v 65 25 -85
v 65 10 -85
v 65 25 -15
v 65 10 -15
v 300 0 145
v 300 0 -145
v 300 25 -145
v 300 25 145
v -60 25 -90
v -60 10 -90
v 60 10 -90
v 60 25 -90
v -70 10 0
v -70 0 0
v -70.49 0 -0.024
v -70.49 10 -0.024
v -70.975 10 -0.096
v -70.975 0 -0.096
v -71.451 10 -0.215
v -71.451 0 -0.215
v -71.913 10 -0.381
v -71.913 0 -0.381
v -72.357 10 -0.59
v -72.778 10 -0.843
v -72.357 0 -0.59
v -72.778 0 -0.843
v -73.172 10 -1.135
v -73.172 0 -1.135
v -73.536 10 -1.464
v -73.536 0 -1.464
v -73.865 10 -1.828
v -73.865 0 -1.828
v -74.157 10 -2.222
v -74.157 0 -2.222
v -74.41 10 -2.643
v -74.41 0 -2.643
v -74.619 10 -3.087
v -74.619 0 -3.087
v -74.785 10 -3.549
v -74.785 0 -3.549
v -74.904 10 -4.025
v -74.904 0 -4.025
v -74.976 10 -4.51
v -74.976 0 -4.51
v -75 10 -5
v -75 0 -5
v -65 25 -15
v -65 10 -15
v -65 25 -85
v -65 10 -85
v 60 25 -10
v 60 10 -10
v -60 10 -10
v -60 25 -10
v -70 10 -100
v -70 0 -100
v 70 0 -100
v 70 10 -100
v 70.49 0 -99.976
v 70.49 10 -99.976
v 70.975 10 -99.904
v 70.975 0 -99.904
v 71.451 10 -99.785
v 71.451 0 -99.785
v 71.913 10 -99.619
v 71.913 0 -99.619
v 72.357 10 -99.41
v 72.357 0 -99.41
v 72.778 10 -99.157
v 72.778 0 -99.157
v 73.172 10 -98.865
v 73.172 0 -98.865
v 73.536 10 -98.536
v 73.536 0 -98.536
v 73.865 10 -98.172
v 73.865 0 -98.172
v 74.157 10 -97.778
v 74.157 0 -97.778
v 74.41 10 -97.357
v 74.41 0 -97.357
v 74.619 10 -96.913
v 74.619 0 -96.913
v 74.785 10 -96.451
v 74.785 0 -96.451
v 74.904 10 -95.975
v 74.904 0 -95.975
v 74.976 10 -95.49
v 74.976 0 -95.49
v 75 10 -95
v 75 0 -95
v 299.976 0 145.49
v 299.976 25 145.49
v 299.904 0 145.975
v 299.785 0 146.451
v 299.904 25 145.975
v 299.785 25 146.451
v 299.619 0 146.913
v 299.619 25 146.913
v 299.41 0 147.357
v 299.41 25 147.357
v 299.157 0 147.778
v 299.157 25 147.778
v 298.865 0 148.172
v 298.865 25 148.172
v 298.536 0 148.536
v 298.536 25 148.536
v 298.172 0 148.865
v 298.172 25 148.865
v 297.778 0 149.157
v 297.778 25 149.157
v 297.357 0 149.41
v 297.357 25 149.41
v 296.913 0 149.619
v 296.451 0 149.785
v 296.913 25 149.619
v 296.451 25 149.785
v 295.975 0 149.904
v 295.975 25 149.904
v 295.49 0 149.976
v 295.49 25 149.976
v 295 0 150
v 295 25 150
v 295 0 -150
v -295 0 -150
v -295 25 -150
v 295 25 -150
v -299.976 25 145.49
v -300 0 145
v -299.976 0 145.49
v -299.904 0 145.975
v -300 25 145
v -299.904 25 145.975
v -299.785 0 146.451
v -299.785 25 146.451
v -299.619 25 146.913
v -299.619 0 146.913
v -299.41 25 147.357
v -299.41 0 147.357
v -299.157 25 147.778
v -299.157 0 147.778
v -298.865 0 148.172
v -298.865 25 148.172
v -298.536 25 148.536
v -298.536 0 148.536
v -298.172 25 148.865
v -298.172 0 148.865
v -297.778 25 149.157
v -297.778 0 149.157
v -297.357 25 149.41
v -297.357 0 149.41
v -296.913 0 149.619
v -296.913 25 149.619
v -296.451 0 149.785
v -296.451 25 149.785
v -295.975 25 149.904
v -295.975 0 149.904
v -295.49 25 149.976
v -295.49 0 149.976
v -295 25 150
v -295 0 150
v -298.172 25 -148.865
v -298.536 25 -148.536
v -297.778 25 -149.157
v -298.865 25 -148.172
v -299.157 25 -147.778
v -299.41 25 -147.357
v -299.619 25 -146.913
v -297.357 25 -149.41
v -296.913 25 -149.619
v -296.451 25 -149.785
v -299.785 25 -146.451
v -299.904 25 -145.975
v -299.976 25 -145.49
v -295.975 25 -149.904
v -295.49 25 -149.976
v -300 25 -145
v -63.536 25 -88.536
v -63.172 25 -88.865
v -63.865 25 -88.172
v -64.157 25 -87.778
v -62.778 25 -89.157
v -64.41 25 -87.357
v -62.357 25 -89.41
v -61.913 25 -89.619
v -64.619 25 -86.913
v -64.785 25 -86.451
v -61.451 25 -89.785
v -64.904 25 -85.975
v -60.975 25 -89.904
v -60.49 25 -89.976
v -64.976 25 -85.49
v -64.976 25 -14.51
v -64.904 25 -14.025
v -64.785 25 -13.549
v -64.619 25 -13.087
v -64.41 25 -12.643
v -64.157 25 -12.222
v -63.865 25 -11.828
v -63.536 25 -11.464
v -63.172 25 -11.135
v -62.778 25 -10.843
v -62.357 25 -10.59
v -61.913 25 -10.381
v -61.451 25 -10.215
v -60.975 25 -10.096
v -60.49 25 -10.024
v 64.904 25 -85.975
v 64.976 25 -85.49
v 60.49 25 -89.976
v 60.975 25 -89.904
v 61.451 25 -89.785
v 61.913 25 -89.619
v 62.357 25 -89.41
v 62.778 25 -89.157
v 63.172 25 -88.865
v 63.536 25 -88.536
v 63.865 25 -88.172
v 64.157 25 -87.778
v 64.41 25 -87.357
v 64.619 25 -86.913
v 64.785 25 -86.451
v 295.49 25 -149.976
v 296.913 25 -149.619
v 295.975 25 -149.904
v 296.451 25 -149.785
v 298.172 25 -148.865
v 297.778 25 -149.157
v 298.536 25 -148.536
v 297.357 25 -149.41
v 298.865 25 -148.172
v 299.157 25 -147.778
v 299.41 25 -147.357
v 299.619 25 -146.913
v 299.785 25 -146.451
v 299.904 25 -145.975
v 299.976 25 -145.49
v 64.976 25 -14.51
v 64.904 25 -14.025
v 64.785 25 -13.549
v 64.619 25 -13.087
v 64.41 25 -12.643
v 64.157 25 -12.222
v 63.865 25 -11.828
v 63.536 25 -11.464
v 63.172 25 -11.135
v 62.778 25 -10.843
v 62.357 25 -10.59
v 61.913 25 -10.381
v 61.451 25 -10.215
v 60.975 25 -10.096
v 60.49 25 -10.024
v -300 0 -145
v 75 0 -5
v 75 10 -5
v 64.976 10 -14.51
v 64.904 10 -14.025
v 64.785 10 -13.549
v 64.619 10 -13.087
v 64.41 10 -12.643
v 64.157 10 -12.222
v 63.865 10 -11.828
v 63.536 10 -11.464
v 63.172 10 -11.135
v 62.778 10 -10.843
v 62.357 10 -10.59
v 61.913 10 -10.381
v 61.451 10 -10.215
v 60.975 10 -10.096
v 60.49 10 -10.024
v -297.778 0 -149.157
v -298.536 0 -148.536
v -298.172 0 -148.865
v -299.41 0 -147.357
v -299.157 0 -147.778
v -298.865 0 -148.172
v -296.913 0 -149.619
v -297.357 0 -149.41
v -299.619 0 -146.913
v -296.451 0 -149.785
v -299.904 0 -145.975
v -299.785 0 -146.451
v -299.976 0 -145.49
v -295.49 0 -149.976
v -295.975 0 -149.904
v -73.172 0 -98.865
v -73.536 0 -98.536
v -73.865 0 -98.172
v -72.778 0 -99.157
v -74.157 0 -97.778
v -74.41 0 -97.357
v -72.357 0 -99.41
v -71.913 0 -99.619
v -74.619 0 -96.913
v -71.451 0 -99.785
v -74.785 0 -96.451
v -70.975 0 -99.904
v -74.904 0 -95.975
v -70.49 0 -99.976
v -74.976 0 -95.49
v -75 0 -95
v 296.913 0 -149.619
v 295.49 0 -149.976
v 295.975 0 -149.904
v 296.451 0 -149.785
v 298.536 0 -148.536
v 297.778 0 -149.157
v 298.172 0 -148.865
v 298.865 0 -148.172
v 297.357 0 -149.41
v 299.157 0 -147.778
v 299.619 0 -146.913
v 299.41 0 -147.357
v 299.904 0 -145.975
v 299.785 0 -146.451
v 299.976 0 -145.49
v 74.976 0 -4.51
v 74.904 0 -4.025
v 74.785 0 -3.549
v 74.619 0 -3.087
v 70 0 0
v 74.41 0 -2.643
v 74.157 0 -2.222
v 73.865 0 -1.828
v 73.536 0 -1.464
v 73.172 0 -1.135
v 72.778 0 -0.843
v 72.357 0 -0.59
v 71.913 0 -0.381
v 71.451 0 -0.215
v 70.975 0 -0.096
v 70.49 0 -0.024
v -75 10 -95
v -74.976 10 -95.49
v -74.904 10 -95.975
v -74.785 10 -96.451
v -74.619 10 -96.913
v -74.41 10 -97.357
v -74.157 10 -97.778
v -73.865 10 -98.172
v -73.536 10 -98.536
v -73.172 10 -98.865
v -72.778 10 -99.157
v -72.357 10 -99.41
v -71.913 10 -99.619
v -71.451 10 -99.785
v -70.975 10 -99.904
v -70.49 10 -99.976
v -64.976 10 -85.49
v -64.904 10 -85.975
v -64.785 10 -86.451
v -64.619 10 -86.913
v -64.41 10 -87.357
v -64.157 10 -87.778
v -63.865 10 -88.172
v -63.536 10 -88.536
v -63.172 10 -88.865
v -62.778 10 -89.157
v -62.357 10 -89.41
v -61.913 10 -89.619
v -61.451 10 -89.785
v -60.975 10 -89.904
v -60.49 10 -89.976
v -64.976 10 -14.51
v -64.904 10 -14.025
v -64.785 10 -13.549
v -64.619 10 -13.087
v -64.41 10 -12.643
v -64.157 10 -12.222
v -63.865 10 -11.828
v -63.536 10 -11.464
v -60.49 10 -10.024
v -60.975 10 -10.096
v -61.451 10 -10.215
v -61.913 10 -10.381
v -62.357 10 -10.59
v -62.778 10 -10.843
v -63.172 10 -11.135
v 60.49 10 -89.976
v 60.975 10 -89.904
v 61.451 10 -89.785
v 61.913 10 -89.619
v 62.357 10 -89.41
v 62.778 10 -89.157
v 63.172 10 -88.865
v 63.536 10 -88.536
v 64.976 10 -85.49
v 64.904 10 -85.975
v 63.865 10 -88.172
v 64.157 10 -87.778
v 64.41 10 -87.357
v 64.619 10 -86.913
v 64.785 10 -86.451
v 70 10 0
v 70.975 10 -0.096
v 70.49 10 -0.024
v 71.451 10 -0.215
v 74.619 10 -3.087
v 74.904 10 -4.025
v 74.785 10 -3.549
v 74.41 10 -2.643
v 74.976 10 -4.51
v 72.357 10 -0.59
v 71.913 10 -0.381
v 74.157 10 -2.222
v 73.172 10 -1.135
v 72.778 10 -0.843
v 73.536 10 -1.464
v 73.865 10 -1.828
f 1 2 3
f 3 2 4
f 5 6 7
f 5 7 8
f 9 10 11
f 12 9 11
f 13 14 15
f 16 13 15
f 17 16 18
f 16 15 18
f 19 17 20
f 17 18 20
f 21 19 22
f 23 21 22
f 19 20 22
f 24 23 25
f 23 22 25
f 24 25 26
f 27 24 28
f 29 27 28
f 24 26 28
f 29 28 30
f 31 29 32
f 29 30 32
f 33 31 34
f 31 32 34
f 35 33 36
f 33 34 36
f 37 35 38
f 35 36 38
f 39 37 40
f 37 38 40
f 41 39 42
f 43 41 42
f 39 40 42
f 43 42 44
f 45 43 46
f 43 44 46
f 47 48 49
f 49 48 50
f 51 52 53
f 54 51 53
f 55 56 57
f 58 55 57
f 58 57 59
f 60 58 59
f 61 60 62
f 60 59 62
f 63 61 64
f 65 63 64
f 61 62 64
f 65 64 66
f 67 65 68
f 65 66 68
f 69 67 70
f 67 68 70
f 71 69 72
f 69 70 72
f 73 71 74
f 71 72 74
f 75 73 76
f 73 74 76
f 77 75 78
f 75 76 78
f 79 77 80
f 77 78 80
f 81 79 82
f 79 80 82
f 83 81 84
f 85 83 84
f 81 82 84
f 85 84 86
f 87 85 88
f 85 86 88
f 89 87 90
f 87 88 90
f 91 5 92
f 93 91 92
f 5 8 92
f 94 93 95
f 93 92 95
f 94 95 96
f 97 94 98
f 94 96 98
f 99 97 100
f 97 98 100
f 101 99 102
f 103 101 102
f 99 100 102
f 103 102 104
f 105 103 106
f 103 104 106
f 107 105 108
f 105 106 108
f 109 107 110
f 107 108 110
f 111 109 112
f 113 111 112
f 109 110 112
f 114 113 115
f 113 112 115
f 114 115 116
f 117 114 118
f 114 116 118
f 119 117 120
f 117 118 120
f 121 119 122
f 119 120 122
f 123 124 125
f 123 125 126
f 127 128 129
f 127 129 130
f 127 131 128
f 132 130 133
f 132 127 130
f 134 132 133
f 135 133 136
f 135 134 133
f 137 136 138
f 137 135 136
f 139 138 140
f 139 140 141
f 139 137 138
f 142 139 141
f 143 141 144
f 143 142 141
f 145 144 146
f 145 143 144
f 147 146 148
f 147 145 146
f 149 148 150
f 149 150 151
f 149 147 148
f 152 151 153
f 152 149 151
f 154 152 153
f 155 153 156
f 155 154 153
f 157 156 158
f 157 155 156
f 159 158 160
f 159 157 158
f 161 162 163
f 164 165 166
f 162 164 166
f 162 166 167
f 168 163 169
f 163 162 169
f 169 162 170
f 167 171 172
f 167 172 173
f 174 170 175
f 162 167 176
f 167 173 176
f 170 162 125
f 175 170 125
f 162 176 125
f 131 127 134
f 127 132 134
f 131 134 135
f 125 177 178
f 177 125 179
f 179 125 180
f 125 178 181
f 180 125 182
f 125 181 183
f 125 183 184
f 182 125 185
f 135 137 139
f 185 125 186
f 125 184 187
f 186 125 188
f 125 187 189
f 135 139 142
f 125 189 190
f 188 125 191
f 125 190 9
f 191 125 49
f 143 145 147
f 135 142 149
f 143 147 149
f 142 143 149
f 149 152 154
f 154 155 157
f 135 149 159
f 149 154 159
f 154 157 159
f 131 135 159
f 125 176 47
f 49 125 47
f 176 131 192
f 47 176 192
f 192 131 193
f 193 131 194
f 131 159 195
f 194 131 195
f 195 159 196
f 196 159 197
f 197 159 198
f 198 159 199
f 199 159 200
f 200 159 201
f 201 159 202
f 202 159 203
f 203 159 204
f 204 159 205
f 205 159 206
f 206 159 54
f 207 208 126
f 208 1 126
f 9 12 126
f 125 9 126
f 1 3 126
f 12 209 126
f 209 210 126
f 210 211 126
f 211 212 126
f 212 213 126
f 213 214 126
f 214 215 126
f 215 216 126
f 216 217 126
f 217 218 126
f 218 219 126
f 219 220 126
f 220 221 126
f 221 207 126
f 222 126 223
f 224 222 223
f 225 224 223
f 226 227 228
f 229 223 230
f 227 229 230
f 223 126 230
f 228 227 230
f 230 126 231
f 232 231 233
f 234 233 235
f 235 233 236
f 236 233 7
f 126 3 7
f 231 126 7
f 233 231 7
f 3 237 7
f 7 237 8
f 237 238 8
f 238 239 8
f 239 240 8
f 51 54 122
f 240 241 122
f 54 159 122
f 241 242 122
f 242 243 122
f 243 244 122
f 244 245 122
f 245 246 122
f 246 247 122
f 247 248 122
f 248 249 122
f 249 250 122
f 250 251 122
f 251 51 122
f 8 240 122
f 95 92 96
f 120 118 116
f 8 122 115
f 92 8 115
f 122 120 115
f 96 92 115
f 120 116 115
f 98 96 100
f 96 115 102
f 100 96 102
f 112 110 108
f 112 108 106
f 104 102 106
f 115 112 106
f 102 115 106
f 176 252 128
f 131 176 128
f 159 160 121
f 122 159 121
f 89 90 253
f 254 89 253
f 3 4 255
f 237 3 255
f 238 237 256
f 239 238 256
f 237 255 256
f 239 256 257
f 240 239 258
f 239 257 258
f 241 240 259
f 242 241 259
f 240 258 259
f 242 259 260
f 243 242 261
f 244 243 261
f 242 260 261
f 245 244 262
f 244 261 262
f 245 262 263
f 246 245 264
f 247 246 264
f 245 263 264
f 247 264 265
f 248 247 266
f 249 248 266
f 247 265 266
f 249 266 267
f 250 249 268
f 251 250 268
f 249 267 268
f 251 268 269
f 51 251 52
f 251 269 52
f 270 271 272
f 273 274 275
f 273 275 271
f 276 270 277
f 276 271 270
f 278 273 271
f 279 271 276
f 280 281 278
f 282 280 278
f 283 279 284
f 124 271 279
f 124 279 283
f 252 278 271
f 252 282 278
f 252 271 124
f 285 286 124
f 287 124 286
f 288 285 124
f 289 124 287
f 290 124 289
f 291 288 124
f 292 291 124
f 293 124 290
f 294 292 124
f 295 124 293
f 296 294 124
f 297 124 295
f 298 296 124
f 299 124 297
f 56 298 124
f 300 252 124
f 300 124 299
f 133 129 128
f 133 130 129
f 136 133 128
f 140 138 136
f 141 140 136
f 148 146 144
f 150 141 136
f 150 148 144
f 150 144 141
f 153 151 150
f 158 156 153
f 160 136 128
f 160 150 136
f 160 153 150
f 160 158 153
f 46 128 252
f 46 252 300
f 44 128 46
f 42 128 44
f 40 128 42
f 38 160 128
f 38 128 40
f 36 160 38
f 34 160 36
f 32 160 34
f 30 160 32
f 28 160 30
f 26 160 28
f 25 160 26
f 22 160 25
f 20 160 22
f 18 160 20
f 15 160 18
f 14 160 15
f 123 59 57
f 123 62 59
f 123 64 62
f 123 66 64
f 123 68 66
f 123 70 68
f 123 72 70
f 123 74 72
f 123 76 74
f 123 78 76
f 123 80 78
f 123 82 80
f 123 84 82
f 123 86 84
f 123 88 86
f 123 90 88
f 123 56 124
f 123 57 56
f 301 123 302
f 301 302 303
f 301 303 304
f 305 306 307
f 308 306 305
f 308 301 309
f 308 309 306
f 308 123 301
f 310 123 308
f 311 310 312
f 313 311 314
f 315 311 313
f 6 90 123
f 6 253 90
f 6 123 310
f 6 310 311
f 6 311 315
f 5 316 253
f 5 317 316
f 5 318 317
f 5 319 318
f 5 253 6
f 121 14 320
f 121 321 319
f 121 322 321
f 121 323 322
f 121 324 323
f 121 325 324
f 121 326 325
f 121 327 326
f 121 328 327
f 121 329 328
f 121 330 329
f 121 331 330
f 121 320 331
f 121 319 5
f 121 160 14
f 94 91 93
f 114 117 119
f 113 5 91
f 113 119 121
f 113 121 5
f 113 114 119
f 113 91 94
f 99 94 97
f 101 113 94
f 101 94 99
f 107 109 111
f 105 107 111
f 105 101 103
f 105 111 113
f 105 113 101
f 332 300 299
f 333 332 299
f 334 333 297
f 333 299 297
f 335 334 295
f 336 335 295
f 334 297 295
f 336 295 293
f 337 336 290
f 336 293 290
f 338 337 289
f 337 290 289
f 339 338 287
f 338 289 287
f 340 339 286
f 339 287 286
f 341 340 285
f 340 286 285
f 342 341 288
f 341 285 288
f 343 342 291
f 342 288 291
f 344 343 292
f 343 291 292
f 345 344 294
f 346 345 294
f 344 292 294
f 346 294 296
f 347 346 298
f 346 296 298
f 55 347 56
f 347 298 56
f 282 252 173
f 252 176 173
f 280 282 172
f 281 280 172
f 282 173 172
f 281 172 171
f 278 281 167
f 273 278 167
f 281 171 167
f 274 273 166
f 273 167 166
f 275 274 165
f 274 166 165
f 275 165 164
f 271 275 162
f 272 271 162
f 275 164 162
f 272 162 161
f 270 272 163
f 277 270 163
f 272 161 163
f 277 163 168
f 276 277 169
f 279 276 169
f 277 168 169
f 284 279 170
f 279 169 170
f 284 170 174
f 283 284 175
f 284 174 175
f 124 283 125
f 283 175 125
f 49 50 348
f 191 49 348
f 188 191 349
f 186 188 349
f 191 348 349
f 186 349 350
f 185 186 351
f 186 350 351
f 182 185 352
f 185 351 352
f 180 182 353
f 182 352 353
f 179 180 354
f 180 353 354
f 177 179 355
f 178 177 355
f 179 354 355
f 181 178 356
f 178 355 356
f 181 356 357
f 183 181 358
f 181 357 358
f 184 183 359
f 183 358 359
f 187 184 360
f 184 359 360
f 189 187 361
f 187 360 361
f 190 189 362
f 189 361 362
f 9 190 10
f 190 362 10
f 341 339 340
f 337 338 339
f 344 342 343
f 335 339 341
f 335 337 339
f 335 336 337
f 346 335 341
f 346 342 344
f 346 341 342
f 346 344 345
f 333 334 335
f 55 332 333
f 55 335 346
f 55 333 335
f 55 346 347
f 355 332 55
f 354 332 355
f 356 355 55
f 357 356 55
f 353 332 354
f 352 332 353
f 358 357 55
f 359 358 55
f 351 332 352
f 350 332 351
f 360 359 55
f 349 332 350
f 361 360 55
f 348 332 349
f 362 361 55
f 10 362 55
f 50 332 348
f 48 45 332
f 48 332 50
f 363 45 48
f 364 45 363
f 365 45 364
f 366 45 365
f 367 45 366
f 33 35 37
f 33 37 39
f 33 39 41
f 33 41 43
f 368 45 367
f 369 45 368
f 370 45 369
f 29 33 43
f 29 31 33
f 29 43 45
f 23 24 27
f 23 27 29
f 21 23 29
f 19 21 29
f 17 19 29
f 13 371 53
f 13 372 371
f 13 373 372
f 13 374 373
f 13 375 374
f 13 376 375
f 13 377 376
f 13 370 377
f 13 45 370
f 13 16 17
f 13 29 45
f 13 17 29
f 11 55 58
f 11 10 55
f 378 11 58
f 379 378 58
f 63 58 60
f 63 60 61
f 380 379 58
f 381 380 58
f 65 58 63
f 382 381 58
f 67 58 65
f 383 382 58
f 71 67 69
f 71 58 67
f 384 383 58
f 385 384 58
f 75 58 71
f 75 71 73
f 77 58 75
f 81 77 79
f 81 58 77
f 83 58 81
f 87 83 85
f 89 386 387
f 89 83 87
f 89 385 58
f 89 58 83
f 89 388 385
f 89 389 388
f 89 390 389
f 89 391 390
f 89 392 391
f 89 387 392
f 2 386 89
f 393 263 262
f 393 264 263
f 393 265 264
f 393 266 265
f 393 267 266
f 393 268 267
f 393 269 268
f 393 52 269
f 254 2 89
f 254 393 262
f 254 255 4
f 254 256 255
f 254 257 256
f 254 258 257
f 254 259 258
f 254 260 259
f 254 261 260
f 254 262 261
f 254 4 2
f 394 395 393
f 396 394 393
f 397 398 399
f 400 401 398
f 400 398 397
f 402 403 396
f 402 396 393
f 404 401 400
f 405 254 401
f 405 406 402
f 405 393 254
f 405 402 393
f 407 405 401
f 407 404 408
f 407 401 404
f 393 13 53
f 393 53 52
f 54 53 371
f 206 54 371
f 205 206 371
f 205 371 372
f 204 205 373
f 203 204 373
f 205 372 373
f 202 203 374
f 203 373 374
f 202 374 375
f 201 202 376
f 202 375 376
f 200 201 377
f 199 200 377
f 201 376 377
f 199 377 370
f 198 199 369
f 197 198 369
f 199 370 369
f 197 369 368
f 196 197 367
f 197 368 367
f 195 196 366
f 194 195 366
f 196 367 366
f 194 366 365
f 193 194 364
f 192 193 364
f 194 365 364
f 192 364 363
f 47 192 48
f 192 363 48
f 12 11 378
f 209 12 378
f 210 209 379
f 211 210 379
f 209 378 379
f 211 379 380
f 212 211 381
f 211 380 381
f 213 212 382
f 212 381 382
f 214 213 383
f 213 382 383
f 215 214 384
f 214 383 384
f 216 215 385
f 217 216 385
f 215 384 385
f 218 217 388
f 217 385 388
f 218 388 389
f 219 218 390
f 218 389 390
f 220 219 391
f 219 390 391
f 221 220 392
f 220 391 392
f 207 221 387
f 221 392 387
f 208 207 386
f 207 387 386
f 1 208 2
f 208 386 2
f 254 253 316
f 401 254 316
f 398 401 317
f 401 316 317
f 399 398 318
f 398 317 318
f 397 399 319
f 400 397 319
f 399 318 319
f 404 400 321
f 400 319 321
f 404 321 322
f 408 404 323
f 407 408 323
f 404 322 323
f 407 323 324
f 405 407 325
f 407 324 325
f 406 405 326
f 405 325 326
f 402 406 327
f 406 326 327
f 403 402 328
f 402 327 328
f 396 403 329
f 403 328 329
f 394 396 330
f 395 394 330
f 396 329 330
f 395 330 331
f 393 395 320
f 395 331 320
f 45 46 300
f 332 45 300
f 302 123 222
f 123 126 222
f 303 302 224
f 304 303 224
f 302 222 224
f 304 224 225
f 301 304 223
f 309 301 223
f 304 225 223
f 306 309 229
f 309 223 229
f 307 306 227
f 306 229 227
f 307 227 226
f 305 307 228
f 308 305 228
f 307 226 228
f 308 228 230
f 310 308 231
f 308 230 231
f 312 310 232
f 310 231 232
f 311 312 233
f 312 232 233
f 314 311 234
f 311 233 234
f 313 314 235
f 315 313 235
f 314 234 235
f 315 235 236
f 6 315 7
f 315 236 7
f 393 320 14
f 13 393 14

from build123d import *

# Parameters (mm, degrees)
F0_W     = 600
F0_H     = 300
F1_DEPTH = 25
F2_R     = 5
F4_DEPTH = 10
F6_DEPTH = 25


with BuildPart() as f1:
    # F0 (on Front) → F1 (new body)
    with BuildSketch(Plane.XZ):
        Rectangle(F0_W, F0_H)
    extrude(amount=-F1_DEPTH)

    # F2
    f2_edges = [f1.edges().sort_by_distance(p)[0] for p in [
        (300, 12.5, -150),
        (-300, 12.5, -150),
        (300, 12.5, 150),
        (-300, 12.5, 150),
    ]]
    fillet(f2_edges, radius=F2_R)

    # F3 (on face) → F4 (cut)
    with BuildSketch(Plane.XZ):
        with BuildLine():
            Line((-70, -100), (70, -100))
            ThreePointArc((70, -100), (73.535534, -98.535534), (75, -95))
            Line((75, -95), (75, -5))
            ThreePointArc((75, -5), (73.535534, -1.464466), (70, 0))
            Line((70, 0), (-70, 0))
            ThreePointArc((-70, 0), (-73.535534, -1.464466), (-75, -5))
            Line((-75, -5), (-75, -95))
            ThreePointArc((-75, -95), (-73.535534, -98.535534), (-70, -100))
        make_face()
    extrude(amount=-F4_DEPTH, mode=Mode.SUBTRACT)

    # F5 (on face) → F6 (cut)
    with BuildSketch(Plane.XZ.offset(-10)):
        with BuildLine():
            Line((60, -10), (-60, -10))
            ThreePointArc((-60, -10), (-63.535534, -11.464466), (-65, -15))
            Line((-65, -15), (-65, -85))
            ThreePointArc((-65, -85), (-63.535534, -88.535534), (-60, -90))
            Line((-60, -90), (60, -90))
            ThreePointArc((60, -90), (63.535534, -88.535534), (65, -85))
            Line((65, -85), (65, -15))
            ThreePointArc((65, -15), (63.535534, -11.464466), (60, -10))
        make_face()
    extrude(amount=-F6_DEPTH, mode=Mode.SUBTRACT)


solid = f1.part
